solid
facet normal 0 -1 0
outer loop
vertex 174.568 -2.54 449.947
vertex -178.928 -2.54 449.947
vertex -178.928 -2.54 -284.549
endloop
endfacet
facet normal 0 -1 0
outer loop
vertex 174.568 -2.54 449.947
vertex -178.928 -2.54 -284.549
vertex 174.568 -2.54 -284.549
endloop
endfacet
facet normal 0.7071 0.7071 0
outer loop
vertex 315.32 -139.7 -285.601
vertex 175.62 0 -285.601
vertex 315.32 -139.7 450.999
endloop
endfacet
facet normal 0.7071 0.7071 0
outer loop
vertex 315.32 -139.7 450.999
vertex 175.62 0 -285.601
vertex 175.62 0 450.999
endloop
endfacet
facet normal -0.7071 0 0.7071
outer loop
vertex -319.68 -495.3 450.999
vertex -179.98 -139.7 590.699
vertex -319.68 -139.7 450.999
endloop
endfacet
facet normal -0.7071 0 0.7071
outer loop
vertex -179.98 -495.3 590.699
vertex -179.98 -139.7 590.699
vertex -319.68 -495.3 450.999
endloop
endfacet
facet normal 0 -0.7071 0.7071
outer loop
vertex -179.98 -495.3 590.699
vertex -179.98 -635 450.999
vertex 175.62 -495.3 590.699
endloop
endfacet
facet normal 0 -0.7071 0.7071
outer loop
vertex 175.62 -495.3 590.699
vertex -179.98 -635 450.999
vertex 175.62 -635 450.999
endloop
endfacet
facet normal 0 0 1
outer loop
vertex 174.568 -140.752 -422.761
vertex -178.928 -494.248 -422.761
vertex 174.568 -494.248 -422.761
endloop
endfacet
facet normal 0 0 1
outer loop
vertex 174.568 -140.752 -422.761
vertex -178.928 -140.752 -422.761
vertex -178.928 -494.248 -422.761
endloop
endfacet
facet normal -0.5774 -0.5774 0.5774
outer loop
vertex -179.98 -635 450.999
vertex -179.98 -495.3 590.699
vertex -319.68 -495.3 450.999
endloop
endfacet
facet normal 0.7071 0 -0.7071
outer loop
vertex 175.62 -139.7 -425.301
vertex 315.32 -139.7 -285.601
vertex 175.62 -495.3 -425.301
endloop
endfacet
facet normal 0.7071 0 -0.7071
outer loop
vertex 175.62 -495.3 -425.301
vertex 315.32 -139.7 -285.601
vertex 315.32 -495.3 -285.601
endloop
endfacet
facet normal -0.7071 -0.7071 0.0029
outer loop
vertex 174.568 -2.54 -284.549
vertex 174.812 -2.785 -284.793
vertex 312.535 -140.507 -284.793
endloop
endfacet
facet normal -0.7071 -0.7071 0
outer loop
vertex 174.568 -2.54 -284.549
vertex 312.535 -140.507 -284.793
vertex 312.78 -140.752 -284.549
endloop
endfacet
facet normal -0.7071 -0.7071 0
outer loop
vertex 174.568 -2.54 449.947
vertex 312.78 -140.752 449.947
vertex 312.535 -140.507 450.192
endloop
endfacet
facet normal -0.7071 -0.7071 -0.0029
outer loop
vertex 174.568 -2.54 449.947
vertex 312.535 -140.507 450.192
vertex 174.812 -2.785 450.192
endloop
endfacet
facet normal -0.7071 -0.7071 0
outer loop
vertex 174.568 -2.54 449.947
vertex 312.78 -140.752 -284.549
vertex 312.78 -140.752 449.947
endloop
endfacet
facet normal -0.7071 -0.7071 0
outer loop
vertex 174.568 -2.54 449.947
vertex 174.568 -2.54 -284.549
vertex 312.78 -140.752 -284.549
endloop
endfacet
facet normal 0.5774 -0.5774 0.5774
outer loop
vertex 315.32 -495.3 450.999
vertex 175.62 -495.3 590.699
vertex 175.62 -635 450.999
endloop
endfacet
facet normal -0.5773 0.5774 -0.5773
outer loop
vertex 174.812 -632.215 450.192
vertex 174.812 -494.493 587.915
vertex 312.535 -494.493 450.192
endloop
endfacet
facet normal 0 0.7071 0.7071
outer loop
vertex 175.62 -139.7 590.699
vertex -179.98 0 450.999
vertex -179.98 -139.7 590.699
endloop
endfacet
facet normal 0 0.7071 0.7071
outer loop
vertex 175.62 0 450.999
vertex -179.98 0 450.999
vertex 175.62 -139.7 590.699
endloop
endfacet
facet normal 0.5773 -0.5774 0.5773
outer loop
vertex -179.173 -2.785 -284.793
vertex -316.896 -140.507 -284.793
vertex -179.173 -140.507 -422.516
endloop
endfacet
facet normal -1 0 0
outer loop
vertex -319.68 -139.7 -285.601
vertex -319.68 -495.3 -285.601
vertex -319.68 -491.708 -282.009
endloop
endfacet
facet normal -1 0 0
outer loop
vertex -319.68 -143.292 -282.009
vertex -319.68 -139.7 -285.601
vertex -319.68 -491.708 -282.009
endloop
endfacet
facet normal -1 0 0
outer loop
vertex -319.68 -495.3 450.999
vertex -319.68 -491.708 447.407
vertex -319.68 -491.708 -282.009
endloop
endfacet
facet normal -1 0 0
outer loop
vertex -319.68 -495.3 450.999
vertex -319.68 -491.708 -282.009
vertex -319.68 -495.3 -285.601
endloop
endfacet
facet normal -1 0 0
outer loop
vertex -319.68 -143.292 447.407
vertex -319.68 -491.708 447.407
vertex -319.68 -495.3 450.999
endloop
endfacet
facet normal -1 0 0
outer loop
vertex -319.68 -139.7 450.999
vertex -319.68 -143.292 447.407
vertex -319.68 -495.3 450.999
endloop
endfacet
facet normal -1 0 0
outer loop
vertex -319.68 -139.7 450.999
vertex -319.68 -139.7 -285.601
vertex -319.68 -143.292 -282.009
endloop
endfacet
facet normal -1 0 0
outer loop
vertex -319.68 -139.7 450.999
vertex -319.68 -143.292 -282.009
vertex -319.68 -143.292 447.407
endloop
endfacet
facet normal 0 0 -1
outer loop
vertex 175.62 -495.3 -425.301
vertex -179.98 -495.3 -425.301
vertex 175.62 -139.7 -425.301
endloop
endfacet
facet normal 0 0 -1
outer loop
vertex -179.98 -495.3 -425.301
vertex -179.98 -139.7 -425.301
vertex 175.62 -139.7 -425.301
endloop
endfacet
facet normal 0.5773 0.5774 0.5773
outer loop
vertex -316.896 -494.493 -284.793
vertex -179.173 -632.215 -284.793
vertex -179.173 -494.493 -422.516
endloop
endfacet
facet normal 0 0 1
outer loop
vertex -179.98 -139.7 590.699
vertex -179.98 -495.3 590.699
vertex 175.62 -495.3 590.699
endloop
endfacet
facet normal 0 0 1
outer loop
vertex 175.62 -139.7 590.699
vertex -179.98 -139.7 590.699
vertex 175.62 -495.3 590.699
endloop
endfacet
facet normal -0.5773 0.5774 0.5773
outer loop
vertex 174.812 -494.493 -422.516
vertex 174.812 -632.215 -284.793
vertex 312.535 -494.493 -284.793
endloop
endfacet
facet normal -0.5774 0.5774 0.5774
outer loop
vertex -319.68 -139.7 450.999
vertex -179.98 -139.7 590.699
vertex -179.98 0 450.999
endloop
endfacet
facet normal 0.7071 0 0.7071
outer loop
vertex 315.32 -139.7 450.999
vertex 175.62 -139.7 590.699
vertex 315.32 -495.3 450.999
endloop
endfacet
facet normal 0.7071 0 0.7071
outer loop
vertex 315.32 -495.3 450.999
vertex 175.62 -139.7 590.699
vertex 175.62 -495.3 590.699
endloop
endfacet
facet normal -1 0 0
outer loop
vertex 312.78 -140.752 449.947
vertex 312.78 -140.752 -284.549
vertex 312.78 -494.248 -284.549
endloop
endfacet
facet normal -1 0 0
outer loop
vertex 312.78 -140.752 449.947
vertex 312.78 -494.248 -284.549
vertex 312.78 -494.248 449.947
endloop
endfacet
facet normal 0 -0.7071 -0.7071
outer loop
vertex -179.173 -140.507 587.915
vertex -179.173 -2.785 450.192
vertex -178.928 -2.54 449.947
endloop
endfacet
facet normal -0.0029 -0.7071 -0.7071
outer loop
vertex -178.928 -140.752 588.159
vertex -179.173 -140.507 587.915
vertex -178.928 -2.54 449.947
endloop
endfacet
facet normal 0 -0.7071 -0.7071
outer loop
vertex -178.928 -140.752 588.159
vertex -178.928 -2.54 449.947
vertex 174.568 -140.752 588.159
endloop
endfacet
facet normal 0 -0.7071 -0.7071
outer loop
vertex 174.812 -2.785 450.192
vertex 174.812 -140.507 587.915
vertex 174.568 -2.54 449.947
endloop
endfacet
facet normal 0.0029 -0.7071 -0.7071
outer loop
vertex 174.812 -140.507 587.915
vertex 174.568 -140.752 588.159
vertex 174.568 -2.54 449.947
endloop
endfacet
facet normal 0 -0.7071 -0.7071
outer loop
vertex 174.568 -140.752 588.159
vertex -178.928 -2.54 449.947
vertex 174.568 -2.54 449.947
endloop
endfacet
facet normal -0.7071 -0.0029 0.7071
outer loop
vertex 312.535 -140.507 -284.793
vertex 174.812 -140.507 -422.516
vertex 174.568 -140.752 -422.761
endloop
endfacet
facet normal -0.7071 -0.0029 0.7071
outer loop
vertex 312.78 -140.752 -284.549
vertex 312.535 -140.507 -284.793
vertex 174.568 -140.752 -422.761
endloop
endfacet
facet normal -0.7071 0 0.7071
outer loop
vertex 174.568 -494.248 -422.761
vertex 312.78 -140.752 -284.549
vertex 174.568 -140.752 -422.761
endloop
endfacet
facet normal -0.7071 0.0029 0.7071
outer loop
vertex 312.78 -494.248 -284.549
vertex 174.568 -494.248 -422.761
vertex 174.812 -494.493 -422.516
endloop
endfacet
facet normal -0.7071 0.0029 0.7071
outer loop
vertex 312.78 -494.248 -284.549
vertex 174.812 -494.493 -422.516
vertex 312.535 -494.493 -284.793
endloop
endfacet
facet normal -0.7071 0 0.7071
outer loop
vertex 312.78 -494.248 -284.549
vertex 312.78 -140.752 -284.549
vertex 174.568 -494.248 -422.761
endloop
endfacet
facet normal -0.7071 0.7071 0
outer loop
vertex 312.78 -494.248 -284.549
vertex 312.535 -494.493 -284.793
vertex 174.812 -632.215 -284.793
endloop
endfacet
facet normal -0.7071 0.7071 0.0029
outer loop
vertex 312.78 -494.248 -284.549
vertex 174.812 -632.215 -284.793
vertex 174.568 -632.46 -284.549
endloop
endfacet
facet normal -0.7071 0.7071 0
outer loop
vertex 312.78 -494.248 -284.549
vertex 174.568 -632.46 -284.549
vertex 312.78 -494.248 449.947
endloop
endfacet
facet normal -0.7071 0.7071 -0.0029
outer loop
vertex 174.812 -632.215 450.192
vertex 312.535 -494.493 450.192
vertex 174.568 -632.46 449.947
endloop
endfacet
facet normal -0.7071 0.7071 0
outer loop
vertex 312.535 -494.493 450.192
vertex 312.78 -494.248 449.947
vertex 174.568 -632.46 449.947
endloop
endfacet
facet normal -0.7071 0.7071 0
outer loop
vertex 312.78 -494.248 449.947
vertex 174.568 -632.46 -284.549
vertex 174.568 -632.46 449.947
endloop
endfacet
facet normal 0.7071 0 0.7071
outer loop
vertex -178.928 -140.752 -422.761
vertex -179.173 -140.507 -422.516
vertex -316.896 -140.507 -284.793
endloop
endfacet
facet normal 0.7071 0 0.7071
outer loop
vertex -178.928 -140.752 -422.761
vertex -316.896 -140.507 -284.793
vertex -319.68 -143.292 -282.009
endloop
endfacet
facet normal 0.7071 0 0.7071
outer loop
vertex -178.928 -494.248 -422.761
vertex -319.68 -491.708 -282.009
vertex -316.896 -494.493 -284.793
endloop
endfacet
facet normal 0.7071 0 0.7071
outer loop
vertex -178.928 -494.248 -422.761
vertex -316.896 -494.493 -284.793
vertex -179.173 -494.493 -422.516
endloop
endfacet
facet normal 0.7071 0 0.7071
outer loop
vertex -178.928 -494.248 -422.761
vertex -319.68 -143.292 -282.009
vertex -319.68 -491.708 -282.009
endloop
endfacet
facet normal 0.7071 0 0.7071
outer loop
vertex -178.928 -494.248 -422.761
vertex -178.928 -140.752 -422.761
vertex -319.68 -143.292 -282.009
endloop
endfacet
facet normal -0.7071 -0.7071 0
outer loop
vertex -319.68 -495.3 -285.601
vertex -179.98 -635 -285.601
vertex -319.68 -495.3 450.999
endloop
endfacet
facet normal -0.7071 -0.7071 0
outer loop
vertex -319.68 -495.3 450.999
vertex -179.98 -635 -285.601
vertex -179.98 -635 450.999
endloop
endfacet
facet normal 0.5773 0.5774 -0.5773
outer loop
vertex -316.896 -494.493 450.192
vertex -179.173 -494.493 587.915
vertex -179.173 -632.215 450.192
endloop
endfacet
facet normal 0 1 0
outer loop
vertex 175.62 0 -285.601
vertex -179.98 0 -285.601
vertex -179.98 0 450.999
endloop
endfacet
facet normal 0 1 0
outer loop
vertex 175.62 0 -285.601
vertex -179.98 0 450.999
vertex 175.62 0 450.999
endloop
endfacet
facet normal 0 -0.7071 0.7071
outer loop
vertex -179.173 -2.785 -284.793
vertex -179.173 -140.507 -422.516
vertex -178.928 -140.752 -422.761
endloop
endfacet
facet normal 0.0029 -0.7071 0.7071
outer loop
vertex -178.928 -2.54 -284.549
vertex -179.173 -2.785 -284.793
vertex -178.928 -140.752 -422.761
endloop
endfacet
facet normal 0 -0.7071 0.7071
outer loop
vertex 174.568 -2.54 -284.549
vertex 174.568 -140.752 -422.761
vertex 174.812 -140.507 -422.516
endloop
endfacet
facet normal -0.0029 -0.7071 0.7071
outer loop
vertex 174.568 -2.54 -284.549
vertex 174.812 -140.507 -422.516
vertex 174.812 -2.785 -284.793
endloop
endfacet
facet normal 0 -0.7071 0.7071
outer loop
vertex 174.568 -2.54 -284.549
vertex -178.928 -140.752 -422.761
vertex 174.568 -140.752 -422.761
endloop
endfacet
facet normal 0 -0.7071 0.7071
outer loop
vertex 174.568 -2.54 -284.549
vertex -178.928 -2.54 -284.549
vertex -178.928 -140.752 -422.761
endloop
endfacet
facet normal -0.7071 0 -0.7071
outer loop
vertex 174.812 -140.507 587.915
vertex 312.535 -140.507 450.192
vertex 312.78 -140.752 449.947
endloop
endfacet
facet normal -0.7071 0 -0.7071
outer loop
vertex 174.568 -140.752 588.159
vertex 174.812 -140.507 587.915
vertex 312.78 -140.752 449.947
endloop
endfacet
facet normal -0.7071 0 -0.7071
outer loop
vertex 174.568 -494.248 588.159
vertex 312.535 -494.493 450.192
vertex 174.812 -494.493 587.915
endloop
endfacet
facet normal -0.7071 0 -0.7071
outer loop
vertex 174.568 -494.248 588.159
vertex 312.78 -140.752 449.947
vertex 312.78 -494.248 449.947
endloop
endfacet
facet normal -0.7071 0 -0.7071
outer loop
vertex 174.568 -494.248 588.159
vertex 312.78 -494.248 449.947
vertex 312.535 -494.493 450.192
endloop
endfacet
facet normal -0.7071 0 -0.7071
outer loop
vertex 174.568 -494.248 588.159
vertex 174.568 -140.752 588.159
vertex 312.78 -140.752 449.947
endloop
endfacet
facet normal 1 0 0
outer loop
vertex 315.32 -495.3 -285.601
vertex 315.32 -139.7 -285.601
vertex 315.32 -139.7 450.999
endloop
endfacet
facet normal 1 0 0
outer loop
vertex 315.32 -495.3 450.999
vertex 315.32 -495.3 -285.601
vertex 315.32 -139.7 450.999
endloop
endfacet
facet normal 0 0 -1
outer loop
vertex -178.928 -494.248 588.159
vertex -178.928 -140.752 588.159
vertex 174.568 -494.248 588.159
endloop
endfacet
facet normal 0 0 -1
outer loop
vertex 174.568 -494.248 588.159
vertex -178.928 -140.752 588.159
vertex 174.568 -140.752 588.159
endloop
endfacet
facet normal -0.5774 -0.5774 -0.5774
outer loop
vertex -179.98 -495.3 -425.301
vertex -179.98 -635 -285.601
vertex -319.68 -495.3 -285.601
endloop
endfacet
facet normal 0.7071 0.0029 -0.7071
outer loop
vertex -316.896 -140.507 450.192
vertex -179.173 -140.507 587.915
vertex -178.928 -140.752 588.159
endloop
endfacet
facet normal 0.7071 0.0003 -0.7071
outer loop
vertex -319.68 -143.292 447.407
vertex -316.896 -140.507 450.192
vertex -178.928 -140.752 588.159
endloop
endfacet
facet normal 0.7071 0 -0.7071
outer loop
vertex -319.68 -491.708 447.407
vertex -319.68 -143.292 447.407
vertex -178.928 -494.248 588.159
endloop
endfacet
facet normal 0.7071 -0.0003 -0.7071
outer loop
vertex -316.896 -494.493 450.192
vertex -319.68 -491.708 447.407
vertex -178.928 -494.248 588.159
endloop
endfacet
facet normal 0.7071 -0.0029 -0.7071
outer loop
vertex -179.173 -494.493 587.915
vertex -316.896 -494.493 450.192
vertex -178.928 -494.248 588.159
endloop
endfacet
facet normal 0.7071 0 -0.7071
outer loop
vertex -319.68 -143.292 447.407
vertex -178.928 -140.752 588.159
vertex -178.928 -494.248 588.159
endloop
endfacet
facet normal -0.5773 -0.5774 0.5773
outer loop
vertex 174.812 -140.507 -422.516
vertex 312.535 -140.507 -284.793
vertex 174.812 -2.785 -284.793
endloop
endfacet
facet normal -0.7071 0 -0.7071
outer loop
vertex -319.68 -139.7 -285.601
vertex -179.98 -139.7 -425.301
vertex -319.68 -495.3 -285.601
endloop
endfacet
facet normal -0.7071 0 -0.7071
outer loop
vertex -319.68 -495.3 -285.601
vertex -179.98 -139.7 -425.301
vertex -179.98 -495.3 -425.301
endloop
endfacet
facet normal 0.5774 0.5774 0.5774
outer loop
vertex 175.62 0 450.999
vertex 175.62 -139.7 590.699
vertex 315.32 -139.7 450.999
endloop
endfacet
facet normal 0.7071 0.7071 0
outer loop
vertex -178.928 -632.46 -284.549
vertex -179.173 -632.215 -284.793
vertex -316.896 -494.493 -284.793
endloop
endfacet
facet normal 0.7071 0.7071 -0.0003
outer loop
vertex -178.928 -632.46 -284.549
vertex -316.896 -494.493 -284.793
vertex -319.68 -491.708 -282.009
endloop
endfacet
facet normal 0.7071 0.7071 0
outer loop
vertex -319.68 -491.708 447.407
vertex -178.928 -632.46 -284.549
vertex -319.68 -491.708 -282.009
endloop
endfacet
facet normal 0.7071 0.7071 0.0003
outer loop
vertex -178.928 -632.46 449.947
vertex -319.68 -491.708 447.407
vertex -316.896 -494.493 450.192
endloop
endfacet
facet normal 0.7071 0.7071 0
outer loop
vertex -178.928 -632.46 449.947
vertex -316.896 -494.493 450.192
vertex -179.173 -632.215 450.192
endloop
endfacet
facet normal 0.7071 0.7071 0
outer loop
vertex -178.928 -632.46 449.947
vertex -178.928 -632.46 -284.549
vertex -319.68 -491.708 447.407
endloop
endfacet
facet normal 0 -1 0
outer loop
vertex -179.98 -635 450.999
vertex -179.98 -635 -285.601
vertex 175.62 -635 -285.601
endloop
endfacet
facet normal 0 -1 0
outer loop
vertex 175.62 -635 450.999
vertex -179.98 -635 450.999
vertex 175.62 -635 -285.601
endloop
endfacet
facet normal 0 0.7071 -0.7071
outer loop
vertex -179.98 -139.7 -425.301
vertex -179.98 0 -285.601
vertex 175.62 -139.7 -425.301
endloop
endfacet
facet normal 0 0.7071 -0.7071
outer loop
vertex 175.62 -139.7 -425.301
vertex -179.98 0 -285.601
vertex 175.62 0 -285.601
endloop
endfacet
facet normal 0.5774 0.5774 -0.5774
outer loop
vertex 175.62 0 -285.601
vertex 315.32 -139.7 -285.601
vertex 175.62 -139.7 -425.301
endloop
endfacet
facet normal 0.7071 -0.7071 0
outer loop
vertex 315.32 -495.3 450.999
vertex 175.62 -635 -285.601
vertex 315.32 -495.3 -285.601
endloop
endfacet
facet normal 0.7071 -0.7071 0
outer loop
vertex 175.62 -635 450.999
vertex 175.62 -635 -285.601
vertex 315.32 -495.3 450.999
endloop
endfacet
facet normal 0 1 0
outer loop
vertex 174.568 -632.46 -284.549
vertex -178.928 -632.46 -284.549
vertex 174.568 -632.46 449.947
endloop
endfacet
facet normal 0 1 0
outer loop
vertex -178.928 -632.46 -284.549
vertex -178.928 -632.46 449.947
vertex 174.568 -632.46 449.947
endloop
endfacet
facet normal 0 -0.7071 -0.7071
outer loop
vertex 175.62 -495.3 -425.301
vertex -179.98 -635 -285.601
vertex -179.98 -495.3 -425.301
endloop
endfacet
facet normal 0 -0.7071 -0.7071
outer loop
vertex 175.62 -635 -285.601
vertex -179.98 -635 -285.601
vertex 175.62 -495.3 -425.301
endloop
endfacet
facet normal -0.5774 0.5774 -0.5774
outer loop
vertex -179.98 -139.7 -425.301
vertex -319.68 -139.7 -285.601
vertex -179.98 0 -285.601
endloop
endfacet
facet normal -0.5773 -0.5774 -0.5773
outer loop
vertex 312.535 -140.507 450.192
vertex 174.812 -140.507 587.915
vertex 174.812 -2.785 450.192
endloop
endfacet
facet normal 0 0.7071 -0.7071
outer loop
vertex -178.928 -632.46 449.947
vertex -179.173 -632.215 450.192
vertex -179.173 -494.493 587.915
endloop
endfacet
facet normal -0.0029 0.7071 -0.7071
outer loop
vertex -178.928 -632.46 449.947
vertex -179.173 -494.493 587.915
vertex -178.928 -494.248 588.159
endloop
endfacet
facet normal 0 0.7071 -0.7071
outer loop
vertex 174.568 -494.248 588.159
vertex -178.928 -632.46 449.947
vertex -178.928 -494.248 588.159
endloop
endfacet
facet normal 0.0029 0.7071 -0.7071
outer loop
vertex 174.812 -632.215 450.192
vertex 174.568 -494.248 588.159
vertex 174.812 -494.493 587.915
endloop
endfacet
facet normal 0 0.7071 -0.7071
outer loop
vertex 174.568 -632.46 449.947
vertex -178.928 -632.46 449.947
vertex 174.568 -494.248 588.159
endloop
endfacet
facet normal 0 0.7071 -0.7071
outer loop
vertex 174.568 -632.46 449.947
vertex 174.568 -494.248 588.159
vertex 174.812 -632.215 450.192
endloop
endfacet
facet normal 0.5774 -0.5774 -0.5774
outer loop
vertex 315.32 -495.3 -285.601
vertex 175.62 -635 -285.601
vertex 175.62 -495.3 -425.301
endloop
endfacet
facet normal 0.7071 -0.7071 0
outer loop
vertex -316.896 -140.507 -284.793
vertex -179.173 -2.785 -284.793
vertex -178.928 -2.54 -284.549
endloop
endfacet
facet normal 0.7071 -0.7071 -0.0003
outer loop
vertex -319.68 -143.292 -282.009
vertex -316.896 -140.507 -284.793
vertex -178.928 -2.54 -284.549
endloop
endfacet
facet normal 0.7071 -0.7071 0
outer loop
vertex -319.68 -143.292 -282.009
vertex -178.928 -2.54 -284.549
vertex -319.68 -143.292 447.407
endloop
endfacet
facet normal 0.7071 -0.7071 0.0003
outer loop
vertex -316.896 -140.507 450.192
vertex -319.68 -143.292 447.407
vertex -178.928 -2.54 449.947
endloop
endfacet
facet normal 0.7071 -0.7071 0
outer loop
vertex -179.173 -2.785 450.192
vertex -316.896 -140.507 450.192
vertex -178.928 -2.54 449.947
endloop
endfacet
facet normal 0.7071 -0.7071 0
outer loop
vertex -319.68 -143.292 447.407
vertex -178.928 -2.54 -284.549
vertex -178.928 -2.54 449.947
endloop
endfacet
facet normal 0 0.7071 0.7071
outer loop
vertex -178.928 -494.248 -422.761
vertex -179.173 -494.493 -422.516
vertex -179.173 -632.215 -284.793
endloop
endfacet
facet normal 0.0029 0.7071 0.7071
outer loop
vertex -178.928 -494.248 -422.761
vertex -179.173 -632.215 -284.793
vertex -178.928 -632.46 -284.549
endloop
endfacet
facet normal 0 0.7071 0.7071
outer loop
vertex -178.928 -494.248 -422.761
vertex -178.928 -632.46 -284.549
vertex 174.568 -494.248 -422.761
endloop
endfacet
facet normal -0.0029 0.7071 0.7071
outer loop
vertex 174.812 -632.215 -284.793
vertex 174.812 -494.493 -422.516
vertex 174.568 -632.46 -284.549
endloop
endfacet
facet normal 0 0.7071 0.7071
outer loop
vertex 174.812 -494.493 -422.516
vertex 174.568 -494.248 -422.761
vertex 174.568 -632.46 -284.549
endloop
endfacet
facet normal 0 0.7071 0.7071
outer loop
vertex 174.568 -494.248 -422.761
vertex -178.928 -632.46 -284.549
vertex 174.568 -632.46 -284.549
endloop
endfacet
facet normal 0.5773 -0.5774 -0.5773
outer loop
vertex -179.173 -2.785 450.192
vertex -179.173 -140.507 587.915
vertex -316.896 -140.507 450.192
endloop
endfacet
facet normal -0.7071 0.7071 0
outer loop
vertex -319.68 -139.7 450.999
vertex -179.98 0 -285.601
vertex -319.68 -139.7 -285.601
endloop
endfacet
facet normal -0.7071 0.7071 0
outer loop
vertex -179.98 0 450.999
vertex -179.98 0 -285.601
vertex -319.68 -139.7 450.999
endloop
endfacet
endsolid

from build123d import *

# Parameters (mm, degrees)
F0_W     = 635
F0_H     = 1016
F1_DEPTH = 635
F2_SIZE  = 139.7
F3_T     = -2.54


with BuildPart() as f1:
    # F0 (on Front) → F1 (new body)
    with BuildSketch(Plane.XZ):
        with Locations((-2.180368, 82.699301)):
            Rectangle(F0_W, F0_H)
    extrude(amount=F1_DEPTH)

    # F2
    f2_edges = [f1.edges().sort_by_distance(p)[0] for p in [
        (315.319632, -317.5, 590.699301),
        (-2.180368, -635, 590.699301),
        (-319.680368, -317.5, 590.699301),
        (-2.180368, 0, 590.699301),
        (315.319632, -635, 82.699301),
        (315.319632, 0, 82.699301),
        (-319.680368, -635, 82.699301),
        (-2.180368, -635, -425.300699),
        (315.319632, -317.5, -425.300699),
        (-319.680368, 0, 82.699301),
        (-319.680368, -317.5, -425.300699),
        (-2.180368, 0, -425.300699),
    ]]
    chamfer(f2_edges, length=F2_SIZE)

    # F3
    f3_openings = [f1.faces().sort_by_distance(p)[0] for p in [
        (-319.680368, -317.5, 82.699301),
    ]]
    offset(amount=F3_T, openings=f3_openings)


solid = f1.part
